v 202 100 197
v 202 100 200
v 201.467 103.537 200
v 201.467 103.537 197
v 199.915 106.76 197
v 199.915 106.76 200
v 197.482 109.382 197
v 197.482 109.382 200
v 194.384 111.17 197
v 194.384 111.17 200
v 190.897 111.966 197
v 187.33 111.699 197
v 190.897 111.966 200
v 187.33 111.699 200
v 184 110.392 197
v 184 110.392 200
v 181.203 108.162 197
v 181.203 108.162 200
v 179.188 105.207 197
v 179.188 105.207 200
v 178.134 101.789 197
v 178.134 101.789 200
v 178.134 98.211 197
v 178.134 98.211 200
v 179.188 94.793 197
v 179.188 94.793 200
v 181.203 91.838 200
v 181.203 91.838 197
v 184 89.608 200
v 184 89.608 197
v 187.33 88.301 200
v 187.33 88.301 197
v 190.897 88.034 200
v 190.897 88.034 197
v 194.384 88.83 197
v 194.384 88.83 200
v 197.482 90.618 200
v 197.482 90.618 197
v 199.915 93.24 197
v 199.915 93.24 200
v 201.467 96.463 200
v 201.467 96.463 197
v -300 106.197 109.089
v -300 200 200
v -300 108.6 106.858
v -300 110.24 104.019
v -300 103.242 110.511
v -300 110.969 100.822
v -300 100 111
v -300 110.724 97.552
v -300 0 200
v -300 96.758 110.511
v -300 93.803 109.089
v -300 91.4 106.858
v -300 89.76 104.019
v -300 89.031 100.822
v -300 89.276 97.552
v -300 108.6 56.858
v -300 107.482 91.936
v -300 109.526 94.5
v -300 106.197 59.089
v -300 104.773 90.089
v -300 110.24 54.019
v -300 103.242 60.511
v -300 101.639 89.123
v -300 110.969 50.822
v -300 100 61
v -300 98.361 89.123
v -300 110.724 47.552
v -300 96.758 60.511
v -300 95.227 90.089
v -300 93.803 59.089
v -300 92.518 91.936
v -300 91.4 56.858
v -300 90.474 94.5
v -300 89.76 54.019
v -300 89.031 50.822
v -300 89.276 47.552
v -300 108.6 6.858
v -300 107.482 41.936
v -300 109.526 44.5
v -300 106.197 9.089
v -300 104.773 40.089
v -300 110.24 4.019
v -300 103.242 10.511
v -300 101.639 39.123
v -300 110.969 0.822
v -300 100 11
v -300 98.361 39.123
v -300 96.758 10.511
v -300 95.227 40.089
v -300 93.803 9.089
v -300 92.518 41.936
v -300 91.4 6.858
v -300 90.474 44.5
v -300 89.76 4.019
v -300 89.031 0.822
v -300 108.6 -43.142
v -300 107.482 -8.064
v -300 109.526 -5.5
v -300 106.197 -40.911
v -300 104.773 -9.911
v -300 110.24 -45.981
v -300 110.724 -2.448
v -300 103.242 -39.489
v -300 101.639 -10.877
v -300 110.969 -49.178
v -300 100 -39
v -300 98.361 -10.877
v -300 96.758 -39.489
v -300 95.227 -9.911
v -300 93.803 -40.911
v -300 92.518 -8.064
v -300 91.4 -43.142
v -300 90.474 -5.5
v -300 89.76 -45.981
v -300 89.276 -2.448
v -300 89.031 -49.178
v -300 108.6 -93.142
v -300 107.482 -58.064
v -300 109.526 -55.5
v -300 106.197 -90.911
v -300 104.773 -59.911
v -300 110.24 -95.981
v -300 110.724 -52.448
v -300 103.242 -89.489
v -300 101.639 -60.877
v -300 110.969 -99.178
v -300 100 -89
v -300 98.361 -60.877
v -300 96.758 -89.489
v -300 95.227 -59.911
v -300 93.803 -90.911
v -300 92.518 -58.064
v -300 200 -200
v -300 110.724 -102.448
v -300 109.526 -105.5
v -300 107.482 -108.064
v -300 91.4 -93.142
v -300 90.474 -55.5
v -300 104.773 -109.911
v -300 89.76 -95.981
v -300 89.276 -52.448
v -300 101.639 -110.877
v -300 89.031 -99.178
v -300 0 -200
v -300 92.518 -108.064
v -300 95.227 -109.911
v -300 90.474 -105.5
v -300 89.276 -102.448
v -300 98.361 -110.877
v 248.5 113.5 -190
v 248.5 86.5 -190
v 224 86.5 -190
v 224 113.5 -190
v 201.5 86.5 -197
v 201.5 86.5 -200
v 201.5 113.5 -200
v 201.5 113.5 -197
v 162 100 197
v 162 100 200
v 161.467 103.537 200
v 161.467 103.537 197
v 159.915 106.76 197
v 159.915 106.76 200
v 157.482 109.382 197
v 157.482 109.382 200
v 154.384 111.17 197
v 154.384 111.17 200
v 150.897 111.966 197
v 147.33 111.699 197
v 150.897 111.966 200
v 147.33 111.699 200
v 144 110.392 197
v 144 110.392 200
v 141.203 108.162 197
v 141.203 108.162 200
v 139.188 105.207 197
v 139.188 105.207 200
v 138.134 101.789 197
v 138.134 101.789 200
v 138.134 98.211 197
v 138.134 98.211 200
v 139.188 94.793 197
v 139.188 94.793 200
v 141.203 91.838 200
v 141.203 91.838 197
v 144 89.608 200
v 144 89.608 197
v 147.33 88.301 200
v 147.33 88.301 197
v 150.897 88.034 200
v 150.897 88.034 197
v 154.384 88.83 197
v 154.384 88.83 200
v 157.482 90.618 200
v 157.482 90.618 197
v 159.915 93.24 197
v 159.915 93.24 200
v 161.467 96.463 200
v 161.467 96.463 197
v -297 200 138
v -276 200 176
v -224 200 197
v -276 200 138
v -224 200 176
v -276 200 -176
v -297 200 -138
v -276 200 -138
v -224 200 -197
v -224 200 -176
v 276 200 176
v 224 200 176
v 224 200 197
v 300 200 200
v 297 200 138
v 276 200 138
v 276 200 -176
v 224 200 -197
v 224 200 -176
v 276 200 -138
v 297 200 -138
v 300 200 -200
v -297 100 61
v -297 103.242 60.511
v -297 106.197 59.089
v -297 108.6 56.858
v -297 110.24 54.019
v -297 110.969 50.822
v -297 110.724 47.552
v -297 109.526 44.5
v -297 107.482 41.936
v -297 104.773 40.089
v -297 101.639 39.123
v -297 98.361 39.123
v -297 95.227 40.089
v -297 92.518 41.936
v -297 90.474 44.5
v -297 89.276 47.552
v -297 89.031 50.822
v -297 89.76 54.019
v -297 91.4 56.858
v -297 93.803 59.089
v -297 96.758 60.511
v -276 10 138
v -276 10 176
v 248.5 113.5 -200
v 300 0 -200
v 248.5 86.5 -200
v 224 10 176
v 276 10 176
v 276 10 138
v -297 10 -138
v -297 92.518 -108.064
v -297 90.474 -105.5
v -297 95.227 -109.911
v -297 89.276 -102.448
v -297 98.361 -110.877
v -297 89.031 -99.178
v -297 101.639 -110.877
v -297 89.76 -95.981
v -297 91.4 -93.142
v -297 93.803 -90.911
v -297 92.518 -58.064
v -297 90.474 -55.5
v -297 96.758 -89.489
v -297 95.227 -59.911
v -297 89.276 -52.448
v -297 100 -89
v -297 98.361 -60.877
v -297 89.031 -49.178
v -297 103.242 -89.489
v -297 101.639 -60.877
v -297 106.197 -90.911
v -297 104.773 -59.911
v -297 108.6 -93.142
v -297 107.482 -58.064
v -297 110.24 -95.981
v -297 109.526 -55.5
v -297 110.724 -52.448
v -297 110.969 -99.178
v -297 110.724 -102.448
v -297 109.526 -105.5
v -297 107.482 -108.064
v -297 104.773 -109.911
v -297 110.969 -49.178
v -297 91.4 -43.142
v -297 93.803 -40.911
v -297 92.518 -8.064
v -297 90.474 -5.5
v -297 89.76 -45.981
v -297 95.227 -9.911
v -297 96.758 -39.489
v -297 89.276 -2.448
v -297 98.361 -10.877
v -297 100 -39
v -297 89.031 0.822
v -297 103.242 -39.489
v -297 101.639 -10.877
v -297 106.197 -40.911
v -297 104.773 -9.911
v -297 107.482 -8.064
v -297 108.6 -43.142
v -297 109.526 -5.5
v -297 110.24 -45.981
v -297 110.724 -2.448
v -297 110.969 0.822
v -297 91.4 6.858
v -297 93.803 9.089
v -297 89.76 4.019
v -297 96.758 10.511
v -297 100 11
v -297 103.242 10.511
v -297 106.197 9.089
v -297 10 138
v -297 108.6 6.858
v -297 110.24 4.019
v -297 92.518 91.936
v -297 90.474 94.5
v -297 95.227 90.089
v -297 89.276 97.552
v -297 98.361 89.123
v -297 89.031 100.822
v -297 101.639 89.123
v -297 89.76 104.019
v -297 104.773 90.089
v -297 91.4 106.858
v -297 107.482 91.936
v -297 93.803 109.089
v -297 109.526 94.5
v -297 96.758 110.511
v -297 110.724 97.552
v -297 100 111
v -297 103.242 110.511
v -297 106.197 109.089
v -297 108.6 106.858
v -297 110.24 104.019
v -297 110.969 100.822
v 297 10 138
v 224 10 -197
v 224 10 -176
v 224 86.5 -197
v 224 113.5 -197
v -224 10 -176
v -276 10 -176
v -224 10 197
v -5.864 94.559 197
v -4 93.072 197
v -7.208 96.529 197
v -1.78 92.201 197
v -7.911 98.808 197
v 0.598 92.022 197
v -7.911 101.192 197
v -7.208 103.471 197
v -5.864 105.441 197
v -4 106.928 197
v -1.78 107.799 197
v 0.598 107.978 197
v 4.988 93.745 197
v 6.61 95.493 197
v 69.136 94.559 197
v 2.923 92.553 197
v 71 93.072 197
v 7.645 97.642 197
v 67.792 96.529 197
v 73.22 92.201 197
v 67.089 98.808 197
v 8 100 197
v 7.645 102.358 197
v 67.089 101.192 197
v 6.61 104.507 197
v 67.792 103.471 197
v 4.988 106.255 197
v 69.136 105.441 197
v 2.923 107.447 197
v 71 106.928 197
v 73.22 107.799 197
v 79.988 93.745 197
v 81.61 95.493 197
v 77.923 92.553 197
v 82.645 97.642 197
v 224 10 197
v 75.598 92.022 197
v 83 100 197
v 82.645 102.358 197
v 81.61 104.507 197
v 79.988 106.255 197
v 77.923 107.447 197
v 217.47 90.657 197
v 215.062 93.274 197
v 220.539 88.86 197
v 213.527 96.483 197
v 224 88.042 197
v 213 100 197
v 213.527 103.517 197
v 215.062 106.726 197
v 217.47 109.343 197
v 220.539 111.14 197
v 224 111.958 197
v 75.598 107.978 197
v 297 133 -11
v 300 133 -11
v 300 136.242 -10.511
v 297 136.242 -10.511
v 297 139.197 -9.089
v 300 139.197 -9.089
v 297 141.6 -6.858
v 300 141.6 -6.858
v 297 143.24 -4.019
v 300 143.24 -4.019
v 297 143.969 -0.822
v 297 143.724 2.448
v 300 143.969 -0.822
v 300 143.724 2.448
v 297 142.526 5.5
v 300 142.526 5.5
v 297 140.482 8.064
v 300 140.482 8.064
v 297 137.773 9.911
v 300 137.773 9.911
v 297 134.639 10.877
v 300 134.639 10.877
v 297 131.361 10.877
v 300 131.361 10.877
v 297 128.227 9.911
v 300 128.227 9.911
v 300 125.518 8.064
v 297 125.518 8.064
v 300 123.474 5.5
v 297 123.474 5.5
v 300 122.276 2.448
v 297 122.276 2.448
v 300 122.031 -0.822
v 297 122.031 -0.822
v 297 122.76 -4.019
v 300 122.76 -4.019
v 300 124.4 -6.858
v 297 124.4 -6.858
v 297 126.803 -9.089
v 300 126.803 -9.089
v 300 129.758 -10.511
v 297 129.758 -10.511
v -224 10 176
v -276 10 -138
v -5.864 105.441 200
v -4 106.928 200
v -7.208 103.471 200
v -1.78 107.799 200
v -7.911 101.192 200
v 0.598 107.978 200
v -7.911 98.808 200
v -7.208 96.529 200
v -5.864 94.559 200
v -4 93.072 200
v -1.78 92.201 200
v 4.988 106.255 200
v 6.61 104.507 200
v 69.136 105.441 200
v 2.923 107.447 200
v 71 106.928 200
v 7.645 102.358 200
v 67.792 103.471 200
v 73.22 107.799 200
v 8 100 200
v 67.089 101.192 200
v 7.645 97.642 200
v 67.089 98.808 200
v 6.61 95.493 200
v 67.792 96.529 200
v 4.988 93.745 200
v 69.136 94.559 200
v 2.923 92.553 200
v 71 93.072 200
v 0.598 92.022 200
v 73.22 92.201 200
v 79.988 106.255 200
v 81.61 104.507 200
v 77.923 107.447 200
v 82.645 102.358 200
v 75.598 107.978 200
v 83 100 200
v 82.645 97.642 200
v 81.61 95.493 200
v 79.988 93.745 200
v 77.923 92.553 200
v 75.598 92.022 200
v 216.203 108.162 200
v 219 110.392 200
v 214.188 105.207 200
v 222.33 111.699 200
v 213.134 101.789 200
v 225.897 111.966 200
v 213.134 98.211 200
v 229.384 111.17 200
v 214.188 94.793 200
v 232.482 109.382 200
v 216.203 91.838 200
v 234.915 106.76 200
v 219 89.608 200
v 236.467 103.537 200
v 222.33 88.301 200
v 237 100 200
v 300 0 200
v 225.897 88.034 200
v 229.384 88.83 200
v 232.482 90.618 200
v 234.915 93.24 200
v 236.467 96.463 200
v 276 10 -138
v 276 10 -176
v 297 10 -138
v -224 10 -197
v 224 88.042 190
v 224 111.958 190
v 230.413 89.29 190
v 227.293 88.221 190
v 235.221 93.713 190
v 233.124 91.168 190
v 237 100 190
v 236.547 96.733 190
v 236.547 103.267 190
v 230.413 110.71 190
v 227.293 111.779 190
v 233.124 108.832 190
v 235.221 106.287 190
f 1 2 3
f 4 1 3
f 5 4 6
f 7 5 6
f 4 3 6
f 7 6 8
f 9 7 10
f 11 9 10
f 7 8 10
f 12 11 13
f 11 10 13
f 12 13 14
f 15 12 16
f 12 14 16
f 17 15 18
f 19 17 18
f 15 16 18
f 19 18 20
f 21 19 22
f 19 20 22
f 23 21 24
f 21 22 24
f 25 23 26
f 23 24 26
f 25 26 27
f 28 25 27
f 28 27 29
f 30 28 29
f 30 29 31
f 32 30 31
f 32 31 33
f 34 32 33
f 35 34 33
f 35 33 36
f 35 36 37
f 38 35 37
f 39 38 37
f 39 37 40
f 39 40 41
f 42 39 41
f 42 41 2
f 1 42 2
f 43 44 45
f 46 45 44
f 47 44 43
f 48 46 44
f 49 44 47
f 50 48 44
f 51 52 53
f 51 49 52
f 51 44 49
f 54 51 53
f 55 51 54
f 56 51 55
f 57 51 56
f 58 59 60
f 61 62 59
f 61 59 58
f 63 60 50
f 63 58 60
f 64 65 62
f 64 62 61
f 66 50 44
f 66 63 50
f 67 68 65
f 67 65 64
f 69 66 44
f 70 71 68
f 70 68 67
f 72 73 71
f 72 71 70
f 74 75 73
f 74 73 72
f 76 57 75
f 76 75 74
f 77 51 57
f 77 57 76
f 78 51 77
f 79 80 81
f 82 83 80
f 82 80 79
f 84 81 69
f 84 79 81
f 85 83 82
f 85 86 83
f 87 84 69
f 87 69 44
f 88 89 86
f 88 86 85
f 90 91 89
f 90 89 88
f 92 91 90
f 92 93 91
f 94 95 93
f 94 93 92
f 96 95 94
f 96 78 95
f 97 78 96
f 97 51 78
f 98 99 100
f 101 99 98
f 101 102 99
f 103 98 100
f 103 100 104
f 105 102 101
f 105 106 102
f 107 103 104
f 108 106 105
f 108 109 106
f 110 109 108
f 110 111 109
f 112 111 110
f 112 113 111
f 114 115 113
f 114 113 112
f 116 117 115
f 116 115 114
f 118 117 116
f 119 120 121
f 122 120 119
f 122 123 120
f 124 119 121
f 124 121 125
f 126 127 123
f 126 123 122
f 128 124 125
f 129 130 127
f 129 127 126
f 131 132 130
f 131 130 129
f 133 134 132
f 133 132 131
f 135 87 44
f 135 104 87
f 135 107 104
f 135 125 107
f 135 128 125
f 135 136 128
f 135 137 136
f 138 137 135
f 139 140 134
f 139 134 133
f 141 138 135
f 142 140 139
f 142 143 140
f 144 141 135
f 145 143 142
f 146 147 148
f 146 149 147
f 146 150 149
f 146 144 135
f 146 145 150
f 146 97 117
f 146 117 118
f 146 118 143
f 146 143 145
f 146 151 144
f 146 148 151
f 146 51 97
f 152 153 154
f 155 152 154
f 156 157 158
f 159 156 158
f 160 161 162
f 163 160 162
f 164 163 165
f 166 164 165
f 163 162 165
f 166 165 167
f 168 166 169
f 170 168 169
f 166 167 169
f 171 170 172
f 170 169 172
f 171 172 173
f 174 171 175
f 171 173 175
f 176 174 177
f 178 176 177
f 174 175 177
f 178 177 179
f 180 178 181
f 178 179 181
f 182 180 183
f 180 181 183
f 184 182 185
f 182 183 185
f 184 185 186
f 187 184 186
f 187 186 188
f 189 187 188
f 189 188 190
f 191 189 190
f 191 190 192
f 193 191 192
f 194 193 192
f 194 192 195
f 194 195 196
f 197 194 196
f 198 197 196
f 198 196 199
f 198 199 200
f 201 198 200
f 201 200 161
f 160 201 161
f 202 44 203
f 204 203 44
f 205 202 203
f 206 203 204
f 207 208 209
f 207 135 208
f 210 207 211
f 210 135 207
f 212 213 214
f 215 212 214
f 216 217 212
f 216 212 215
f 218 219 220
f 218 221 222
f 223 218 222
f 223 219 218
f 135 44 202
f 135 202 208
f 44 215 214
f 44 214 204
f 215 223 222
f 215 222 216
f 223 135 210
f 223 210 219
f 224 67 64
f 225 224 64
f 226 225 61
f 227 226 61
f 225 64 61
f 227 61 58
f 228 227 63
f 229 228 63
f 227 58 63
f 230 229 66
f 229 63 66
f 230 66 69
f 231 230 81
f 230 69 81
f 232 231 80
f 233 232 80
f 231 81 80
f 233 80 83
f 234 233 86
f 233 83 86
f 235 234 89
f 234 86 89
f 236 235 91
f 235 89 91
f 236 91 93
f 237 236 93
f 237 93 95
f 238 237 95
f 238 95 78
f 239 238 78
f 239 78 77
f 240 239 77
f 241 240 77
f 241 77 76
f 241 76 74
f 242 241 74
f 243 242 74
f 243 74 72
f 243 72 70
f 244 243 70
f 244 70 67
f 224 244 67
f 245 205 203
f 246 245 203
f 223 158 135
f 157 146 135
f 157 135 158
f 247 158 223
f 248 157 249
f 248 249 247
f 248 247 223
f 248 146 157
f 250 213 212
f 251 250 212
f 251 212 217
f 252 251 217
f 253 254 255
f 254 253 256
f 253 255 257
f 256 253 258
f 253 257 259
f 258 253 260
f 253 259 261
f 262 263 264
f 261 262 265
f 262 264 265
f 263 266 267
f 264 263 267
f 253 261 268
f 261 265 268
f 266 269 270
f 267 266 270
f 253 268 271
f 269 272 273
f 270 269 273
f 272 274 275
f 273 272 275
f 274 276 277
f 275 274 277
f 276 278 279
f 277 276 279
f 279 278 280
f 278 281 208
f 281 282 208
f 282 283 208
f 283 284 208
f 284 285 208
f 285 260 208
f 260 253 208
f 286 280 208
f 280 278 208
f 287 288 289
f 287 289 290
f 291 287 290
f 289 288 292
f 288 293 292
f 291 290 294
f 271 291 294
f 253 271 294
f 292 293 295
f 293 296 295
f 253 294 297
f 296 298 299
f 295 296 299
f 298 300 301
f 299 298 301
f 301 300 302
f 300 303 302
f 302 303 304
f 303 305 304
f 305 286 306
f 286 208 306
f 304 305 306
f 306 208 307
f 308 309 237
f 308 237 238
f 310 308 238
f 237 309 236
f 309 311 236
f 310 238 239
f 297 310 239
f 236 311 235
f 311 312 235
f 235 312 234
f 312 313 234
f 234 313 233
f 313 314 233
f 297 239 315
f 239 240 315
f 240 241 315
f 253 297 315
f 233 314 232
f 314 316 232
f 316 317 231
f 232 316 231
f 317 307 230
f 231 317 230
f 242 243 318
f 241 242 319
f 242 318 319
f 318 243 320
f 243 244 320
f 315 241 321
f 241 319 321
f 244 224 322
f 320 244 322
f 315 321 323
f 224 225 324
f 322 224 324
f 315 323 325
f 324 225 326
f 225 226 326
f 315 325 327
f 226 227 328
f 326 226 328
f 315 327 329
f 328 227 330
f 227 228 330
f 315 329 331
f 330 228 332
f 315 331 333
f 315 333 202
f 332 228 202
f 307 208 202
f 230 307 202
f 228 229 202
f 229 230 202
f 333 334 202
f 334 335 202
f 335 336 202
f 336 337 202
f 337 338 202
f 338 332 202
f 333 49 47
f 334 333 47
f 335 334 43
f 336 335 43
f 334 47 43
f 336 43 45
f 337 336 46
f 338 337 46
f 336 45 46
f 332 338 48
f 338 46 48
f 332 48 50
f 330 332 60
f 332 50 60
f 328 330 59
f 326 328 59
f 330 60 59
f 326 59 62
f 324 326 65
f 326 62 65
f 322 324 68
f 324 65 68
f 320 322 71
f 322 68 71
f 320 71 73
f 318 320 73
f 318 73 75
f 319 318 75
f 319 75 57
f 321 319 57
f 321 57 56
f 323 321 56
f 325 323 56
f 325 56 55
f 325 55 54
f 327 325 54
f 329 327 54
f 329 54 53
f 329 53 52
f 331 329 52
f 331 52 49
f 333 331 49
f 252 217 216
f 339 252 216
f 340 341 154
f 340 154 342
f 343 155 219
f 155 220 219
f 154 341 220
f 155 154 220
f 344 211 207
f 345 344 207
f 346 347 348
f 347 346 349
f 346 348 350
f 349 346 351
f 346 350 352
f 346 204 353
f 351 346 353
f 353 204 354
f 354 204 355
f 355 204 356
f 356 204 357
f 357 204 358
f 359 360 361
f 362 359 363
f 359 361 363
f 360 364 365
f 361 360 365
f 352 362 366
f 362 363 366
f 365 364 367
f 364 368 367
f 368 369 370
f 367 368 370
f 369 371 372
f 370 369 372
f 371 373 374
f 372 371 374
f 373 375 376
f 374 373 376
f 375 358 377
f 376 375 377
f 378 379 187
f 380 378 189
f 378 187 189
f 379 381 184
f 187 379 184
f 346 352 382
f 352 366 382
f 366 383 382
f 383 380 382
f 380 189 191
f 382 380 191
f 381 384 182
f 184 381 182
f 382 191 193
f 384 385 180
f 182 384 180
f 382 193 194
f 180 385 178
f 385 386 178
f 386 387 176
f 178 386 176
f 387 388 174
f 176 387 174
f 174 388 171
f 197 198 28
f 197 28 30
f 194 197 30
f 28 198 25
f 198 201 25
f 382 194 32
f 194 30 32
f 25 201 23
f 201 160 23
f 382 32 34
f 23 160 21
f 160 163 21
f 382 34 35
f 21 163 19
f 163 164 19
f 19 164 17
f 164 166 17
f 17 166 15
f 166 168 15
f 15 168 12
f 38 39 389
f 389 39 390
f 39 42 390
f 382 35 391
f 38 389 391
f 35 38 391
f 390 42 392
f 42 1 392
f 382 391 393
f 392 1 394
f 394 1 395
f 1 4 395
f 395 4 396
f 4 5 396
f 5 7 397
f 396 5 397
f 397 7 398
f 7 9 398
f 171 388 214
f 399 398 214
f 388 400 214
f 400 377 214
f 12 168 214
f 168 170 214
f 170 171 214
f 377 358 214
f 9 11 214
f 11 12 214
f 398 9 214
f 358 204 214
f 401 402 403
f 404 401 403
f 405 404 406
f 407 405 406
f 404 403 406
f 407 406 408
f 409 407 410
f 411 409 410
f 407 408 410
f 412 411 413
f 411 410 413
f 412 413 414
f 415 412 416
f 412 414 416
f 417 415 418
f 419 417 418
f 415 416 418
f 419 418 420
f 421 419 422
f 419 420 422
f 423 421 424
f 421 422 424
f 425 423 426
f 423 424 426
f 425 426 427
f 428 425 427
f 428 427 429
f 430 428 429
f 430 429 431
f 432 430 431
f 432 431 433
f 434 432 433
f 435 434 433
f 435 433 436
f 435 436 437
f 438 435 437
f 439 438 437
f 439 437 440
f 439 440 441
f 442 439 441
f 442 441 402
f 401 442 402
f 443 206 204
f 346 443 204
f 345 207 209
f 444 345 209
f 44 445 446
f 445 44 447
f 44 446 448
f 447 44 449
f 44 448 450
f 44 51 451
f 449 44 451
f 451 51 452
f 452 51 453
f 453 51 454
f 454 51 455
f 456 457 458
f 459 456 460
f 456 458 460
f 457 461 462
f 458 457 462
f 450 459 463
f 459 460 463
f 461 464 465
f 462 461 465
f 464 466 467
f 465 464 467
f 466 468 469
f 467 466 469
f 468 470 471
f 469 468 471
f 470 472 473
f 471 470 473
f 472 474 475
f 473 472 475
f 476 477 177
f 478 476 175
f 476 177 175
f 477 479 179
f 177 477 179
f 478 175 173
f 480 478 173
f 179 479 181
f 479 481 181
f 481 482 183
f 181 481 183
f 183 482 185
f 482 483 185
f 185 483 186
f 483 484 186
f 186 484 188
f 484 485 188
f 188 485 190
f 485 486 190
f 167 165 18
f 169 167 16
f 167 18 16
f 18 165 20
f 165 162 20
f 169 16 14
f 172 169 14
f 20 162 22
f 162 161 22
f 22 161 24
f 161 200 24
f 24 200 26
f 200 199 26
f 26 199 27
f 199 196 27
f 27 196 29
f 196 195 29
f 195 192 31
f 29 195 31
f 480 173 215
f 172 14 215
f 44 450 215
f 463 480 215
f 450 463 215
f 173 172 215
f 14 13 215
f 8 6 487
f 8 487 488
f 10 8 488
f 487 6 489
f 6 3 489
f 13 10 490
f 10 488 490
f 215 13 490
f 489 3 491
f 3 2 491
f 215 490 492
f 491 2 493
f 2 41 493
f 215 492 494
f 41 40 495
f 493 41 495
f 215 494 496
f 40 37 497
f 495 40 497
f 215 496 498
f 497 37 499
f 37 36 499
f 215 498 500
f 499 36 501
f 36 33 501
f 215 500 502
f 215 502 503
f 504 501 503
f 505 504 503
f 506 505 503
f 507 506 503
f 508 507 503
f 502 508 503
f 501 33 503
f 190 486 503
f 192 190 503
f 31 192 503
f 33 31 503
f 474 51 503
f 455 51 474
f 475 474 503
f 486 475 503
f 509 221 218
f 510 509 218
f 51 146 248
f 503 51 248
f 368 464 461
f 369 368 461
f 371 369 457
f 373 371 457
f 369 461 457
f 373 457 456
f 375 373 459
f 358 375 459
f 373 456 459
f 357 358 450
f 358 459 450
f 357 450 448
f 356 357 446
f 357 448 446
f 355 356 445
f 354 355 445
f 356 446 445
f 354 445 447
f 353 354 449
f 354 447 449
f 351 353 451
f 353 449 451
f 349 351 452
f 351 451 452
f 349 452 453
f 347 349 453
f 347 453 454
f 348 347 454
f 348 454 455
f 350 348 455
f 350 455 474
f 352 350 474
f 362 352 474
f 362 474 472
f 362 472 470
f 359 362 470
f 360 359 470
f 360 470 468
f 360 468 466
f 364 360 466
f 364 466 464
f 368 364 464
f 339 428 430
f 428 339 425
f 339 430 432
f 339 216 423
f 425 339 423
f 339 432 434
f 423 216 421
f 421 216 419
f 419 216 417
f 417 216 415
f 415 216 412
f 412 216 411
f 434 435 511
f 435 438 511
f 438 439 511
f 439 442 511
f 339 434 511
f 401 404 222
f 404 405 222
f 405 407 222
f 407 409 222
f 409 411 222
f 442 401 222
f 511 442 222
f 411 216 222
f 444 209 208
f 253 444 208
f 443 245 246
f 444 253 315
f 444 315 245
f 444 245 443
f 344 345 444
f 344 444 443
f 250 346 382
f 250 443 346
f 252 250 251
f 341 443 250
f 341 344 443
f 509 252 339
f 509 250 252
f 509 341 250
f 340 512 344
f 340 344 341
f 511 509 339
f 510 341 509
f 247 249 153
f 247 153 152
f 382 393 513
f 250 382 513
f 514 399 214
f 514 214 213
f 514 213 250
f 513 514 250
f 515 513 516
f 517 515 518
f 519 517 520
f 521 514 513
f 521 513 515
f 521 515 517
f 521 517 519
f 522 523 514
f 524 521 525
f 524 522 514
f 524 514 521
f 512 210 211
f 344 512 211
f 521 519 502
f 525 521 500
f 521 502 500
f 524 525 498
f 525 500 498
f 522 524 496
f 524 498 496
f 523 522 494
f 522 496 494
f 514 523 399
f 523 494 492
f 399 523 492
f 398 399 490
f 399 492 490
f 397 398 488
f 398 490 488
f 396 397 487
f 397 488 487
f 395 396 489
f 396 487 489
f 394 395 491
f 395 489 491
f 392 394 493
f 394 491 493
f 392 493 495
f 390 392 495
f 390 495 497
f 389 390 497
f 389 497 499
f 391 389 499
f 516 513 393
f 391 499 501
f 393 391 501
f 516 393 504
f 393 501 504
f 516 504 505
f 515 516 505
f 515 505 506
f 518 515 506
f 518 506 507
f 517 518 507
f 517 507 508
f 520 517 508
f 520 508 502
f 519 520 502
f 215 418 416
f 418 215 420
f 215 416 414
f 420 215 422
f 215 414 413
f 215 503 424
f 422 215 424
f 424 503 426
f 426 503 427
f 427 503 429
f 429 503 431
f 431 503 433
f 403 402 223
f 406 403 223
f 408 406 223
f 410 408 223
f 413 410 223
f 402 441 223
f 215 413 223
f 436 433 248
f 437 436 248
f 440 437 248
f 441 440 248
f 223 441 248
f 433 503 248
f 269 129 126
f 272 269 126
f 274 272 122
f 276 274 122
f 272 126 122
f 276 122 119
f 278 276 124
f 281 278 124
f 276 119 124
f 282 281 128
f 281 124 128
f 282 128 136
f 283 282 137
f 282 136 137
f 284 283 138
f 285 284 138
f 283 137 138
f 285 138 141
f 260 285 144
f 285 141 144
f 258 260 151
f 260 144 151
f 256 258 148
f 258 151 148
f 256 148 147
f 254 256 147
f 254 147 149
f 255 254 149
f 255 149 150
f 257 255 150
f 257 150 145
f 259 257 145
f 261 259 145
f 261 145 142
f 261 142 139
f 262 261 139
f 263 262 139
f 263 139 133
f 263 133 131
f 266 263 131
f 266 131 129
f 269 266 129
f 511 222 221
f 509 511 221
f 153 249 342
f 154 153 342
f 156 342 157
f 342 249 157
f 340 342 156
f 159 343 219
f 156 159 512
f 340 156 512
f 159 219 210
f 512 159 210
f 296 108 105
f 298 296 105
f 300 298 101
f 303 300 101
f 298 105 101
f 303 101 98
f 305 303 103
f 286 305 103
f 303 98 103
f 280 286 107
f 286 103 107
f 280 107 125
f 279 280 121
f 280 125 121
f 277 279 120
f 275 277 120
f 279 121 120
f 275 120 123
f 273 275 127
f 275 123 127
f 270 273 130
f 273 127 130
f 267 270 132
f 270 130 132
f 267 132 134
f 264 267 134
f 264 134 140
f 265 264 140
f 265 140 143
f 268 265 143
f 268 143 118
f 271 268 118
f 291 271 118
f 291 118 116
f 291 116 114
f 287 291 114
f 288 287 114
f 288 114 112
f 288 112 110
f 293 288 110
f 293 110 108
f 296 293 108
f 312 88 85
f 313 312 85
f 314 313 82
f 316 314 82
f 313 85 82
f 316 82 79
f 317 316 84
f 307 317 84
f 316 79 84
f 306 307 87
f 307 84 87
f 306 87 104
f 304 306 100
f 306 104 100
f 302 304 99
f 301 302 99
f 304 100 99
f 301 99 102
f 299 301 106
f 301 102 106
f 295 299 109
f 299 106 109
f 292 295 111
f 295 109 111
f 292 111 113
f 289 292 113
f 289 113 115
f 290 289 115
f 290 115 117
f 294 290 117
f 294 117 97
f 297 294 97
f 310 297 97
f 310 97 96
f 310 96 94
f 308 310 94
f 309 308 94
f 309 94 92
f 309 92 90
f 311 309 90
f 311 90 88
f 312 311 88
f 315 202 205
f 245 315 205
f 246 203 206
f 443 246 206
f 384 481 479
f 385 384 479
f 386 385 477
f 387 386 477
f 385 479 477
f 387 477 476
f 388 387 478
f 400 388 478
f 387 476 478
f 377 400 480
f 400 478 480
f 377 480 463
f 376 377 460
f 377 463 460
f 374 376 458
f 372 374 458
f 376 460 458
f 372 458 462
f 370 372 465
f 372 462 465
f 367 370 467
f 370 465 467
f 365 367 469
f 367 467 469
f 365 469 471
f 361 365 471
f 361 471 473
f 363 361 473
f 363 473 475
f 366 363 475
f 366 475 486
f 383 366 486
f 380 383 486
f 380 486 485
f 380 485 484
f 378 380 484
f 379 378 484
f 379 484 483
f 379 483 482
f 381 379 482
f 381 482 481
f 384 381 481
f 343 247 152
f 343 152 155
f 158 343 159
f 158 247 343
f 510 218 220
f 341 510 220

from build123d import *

# Parameters (mm, degrees)
SKETCH1_W           = 600
SKETCH1_H           = 400
BOSS_EXTRUDE1_DEPTH = 200
CUT_EXTRUDE1_DEPTH  = 190
SKETCH3_R           = 11
CUT_EXTRUDE2_DEPTH  = 10
SKETCH4_R           = 12
SKETCH4_R_2         = 8
CUT_EXTRUDE3_DEPTH  = 10
SKETCH5_W           = 47
SKETCH5_H           = 27
CUT_EXTRUDE4_DEPTH  = 10
SKETCH6_R           = 11
CUT_EXTRUDE5_DEPTH  = 10


with BuildPart() as part:
    # Sketch1 → Boss-Extrude1 (new body)
    with BuildSketch(Plane(origin=(0, 0, 0), x_dir=(1, 0, 0), z_dir=(0, 1, 0))):
        Rectangle(SKETCH1_W, SKETCH1_H)
    extrude(amount=BOSS_EXTRUDE1_DEPTH)

    # Sketch2 → Cut-Extrude1 (cut)
    with BuildSketch(Plane(origin=(0, 200, 0), x_dir=(1, 0, 0), z_dir=(0, 1, 0))):
        Polygon((-224, -197), (224, -197), (224, -176), (276, -176), (276, -138), (297, -138), (297, 138), (276, 138), (276, 176), (224, 176), (224, 197), (-224, 197), (-224, 176), (-276, 176), (-276, 138), (-297, 138), (-297, -138), (-276, -138), (-276, -176), (-224, -176), align=None)
    extrude(amount=-CUT_EXTRUDE1_DEPTH, mode=Mode.SUBTRACT)

    # Sketch3 → Cut-Extrude2 (cut)
    with BuildSketch(Plane.ZY.offset(300)):
        with Locations((-100, 100)):
            Circle(SKETCH3_R)
        with Locations((-50, 100)):
            Circle(SKETCH3_R)
        with Locations((50, 100)):
            Circle(SKETCH3_R)
        with Locations((100, 100)):
            Circle(SKETCH3_R)
        with Locations((0, 100)):
            Circle(SKETCH3_R)
    extrude(amount=-CUT_EXTRUDE2_DEPTH, mode=Mode.SUBTRACT)

    # Sketch4 → Cut-Extrude3 (cut)
    with BuildSketch(Plane.XY.offset(200)):
        with Locations((150, 100)):
            Circle(SKETCH4_R)
        with Locations((75, 100)):
            Circle(SKETCH4_R_2)
        with Locations((225, 100)):
            Circle(SKETCH4_R)
        with Locations((0, 100)):
            Circle(SKETCH4_R_2)
        with Locations((190, 100)):
            Circle(SKETCH4_R)
    extrude(amount=-CUT_EXTRUDE3_DEPTH, mode=Mode.SUBTRACT)

    # Sketch5 → Cut-Extrude4 (cut)
    with BuildSketch(Plane(origin=(0, 0, -200), x_dir=(-1, 0, 0), z_dir=(0, 0, -1))):
        with Locations((-225, 100)):
            Rectangle(SKETCH5_W, SKETCH5_H)
    extrude(amount=-CUT_EXTRUDE4_DEPTH, mode=Mode.SUBTRACT)

    # Sketch6 → Cut-Extrude5 (cut)
    with BuildSketch(Plane(origin=(300, 0, 0), x_dir=(0, 0, -1), z_dir=(1, 0, 0))):
        with Locations((0, 133)):
            Circle(SKETCH6_R)
    extrude(amount=-CUT_EXTRUDE5_DEPTH, mode=Mode.SUBTRACT)


solid = part.part
